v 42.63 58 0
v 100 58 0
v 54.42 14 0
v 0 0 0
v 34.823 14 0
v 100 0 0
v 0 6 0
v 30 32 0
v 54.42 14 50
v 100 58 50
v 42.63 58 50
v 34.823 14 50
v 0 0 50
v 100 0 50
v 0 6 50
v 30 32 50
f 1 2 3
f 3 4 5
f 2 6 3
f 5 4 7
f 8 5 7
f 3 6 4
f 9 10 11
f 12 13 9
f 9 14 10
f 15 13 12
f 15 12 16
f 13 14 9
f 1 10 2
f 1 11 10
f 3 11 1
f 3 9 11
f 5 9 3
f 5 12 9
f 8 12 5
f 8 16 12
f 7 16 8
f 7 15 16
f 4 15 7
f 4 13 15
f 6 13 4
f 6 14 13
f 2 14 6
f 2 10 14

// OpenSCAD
// Bench stand for a 10.1" Raspberry Pi DSI touch panel.
// Two identical feet. Print 2. No supports - it lies flat on its side.
//
// MEASURE edge_t WITH CALIPERS FIRST. Everything else can stay as-is.

edge_t     = 11.0;  // thickness of the display assembly at its bottom edge
clearance  =  1.2;  // slop so it drops in rather than needing a push

lean       = 15;    // degrees back from vertical
depth      = 100;   // front-to-back footprint
height     =  58;   // height at the back
width      =  50;   // width of each foot
slot_floor =  14;   // slot floor height above the bench
front_x    =  30;   // where the slot's front wall meets the lip
lip_h      =  32;   // front lip height - deliberately below `height`
toe_h      =   6;   // thickness at the very front edge

slot_w   = edge_t + clearance;
rise     = height - slot_floor;
lip_rise = lip_h  - slot_floor;
dx       = rise     * tan(lean);
lip_dx   = lip_rise * tan(lean);
horiz    = slot_w / cos(lean);

fx_top = front_x;
fx_bot = fx_top + lip_dx;
bx_top = fx_top + horiz;
bx_bot = bx_top + dx;

assert(bx_bot < depth - 6, "slot runs out the back - raise depth or drop front_x");
assert(fx_top > 6,         "slot too close to the front edge");

module foot() {
    linear_extrude(height = width)
        polygon([[0, 0], [depth, 0], [depth, height],
                 [bx_top, height], [bx_bot, slot_floor],
                 [fx_bot, slot_floor], [fx_top, lip_h],
                 [0, toe_h]]);
}

foot();
// Both feet are identical - the profile is uniform across the width, so there
// is no left or right hand to it. Mirroring would only flip it front-to-back.
